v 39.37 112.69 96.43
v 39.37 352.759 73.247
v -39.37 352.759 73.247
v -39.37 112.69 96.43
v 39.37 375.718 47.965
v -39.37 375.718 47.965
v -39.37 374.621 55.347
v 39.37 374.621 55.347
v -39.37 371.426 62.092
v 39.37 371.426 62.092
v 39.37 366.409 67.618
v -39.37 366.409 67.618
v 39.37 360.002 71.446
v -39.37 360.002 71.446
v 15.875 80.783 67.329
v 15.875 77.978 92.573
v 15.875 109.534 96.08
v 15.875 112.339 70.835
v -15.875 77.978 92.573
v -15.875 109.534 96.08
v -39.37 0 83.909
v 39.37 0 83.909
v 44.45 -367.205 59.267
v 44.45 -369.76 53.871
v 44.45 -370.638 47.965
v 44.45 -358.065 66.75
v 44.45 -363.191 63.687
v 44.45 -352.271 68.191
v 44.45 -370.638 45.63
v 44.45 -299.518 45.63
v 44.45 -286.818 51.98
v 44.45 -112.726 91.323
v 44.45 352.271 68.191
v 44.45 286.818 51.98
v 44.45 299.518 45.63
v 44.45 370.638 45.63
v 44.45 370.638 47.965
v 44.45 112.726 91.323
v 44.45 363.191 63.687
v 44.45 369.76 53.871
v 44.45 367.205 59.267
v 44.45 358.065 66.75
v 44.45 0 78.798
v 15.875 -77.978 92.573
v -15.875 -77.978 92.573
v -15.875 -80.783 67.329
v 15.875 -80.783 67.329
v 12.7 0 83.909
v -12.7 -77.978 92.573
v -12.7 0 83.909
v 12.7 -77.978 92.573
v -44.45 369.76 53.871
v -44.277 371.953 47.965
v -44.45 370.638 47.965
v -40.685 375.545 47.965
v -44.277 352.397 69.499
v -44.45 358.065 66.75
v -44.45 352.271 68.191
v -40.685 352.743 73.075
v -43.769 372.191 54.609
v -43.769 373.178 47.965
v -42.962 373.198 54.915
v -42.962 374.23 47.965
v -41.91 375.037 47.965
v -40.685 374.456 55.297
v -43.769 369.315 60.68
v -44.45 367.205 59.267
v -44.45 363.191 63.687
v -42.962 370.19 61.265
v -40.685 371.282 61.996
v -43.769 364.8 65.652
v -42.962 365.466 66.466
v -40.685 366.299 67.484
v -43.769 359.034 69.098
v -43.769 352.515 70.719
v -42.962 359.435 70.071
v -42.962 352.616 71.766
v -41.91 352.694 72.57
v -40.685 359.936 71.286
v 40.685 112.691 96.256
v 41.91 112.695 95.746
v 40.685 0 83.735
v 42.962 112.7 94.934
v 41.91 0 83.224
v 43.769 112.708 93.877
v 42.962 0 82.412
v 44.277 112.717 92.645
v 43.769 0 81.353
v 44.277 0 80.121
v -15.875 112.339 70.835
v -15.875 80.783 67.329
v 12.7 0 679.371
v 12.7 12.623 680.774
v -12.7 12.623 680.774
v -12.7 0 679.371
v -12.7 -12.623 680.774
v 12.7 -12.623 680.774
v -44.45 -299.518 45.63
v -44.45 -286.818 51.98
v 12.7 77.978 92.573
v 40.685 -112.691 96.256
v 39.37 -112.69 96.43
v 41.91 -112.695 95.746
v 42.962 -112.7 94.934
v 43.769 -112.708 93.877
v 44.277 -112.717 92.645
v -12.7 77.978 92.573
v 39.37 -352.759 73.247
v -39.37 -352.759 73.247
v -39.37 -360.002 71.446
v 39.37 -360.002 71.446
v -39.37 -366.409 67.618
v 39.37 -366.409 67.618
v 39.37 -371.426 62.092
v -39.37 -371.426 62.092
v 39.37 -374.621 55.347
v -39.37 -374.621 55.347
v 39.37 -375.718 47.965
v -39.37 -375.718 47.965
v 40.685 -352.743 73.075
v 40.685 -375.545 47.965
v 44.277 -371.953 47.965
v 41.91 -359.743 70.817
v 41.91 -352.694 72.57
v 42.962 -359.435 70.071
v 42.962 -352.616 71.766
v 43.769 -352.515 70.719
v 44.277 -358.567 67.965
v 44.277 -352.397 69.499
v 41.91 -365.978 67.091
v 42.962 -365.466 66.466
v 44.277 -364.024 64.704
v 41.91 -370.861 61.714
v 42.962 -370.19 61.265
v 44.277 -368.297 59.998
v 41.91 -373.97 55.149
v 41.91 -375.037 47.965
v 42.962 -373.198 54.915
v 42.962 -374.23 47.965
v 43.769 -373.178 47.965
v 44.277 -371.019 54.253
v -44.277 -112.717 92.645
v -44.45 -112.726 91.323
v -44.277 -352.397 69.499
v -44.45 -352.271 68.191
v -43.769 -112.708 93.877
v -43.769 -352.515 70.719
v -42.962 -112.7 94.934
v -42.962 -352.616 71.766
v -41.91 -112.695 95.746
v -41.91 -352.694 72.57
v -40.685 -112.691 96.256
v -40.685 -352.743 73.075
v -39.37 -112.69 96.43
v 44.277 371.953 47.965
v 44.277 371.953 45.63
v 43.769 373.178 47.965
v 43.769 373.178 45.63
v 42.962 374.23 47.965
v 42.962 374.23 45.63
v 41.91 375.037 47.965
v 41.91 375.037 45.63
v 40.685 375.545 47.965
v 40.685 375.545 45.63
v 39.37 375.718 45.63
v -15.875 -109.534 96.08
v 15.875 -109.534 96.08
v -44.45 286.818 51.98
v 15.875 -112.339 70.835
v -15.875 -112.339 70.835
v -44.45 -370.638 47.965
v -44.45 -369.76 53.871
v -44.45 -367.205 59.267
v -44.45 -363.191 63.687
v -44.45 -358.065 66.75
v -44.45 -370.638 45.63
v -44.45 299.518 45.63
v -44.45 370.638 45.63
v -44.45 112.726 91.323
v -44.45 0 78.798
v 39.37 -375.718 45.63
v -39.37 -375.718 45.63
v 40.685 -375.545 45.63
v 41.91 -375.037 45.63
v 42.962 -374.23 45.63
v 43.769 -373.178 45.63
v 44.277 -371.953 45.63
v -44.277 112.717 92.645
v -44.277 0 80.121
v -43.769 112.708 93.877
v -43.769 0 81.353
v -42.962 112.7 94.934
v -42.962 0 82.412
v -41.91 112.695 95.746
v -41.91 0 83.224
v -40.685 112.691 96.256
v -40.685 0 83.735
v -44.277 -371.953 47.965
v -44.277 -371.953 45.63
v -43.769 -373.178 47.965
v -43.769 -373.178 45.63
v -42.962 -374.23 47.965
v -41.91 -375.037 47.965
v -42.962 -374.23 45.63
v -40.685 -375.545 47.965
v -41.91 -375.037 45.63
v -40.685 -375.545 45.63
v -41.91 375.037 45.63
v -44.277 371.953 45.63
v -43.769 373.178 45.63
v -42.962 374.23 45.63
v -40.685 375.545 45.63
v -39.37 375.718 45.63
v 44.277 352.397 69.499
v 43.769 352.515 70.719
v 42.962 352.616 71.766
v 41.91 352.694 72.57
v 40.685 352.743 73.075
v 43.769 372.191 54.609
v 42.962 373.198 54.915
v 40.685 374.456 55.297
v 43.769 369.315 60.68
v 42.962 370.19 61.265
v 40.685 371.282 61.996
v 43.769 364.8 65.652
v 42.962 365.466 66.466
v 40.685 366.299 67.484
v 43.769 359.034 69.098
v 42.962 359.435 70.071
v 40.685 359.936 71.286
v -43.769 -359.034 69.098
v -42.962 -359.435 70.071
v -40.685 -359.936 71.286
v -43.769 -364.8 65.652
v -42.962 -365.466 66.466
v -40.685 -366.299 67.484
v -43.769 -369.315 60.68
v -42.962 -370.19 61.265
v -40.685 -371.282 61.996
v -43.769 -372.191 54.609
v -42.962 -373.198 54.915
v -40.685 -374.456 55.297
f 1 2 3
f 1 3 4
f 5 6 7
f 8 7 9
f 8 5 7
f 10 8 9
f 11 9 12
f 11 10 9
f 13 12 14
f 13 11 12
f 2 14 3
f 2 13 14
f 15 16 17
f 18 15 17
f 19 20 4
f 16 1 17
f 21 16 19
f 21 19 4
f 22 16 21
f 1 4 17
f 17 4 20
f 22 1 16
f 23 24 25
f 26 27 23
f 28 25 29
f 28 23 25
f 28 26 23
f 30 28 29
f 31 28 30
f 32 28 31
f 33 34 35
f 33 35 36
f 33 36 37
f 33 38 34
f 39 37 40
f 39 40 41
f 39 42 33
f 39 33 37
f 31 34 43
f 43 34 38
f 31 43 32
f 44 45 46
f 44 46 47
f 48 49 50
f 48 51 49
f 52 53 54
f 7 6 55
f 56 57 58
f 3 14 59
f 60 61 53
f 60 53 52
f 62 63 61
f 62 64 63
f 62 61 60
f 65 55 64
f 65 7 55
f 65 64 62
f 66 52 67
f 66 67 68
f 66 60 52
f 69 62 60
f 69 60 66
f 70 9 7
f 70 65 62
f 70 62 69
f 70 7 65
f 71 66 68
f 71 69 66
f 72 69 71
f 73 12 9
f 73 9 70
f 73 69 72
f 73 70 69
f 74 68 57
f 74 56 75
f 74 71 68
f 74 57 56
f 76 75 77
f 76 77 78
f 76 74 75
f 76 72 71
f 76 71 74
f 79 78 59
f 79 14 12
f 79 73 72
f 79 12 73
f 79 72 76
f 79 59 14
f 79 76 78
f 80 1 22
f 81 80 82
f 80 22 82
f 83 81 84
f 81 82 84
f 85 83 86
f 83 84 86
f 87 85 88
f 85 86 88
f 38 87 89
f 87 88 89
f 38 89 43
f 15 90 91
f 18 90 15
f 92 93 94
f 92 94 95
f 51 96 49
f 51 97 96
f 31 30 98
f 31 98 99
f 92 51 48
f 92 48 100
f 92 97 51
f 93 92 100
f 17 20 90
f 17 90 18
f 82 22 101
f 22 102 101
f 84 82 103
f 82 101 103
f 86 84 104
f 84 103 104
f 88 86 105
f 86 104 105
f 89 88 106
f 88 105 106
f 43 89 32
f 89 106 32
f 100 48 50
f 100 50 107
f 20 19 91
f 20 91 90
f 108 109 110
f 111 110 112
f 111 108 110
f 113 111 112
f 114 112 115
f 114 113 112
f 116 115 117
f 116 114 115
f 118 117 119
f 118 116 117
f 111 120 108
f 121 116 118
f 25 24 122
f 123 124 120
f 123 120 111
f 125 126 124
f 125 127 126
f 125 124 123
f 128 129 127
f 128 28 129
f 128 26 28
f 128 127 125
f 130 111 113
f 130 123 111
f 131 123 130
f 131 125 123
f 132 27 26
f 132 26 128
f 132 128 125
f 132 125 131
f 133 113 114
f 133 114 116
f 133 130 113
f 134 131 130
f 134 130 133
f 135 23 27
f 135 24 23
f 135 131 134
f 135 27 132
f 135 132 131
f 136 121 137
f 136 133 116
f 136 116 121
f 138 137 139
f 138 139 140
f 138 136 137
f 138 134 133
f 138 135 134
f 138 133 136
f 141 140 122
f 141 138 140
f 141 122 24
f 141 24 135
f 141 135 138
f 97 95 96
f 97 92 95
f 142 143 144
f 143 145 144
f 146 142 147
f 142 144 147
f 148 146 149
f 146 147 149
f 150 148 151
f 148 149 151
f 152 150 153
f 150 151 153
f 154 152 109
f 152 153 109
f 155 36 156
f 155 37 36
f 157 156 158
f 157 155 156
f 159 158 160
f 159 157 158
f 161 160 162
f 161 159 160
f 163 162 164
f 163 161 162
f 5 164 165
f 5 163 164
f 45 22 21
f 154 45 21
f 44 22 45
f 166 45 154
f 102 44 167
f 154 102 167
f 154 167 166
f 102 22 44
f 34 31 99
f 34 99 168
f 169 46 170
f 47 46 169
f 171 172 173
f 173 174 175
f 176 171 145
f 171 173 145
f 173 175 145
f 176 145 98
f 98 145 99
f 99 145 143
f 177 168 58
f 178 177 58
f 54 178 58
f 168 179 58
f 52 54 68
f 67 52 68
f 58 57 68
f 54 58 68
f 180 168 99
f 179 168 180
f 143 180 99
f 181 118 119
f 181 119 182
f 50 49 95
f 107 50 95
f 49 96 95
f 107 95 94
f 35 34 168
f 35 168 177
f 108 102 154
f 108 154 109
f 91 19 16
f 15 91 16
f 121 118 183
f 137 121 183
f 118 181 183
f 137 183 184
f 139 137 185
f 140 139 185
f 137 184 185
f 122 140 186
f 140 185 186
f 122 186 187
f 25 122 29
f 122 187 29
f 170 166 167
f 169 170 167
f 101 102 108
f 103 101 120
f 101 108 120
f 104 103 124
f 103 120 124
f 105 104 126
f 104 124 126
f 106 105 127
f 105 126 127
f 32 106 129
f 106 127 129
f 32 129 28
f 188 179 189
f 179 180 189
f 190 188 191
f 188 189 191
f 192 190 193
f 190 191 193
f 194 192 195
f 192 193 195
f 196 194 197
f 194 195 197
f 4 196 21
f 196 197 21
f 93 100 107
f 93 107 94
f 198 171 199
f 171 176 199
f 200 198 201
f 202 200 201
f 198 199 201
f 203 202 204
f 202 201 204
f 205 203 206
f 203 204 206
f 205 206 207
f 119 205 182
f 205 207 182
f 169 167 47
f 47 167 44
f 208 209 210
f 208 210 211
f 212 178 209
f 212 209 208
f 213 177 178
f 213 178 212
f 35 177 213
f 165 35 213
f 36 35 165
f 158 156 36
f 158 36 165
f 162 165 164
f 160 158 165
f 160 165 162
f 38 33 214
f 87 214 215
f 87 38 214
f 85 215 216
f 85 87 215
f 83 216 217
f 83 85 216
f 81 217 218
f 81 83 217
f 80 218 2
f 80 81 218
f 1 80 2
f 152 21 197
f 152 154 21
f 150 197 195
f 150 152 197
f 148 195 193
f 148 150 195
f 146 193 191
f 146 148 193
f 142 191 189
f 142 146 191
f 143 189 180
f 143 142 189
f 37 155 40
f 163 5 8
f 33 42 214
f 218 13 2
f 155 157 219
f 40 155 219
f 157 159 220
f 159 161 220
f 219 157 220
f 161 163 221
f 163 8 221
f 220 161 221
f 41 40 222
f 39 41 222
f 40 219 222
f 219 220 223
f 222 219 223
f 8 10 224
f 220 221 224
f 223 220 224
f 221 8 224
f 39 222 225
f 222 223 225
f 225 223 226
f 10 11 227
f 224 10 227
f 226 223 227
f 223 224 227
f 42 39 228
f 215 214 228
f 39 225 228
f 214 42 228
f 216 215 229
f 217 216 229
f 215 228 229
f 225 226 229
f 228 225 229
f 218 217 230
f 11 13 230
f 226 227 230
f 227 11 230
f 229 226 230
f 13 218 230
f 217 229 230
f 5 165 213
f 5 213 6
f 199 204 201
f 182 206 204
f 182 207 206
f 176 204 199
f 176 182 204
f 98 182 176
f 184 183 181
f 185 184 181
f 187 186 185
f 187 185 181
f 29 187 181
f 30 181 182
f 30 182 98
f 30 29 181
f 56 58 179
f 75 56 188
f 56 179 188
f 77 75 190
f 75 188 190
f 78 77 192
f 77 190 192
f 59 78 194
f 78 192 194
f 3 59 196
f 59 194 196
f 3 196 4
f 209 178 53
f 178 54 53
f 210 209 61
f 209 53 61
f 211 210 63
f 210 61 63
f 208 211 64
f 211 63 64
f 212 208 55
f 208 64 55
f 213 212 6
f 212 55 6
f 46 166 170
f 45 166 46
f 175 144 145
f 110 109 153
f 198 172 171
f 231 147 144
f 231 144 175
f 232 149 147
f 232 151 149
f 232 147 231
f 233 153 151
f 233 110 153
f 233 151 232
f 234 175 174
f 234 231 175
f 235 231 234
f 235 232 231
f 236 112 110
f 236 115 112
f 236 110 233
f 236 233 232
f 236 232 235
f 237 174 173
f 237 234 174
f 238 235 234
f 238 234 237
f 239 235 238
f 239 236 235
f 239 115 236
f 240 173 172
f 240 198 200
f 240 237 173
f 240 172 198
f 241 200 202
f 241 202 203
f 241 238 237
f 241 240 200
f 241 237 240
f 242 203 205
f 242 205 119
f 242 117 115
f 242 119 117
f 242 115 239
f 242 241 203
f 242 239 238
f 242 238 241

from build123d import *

# Parameters (mm, degrees)
F1_DEPTH = 44.45
F2_W     = 31.75
F2_H     = 31.75
F3_DEPTH = 25.4
F4_W     = 31.75
F4_H     = 31.75
F5_DEPTH = 25.4
F6_R     = 5.08
F8_DEPTH = 12.7


with BuildPart() as f1:
    # F0 (on Right) → F1 (new body, symmetric)
    with BuildSketch(Plane.YZ):
        with BuildLine():
            Line((0, 51.980157), (0, 83.909086))
            Line((0, 83.909086), (-112.68964, 96.430157))
            Line((-112.68964, 96.430157), (-352.759174, 73.247209))
            ThreePointArc((-352.759174, 73.247209), (-369.121611, 65.04034), (-375.717714, 47.964818))
            Line((-375.717714, 47.964818), (-375.717714, 45.630157))
            Line((-375.717714, 45.630157), (-299.517714, 45.630157))
            Line((-299.517714, 45.630157), (-286.817714, 51.980157))
            Line((-286.817714, 51.980157), (0, 51.980157))
        make_face()
        with BuildLine():
            Line((112.68964, 96.430157), (0, 83.909086))
            Line((0, 83.909086), (0, 51.980157))
            Line((0, 51.980157), (286.817714, 51.980157))
            Line((286.817714, 51.980157), (299.517714, 45.630157))
            Line((299.517714, 45.630157), (375.717714, 45.630157))
            Line((375.717714, 45.630157), (375.717714, 47.964818))
            ThreePointArc((375.717714, 47.964818), (369.121611, 65.04034), (352.759174, 73.247209))
            Line((352.759174, 73.247209), (112.68964, 96.430157))
        make_face()
    extrude(amount=F1_DEPTH, both=True)

    # F2 (on face) → F3 (cut)
    with BuildSketch(Plane(origin=(0, 9.209534, 82.885804), x_dir=(1, 0, 0), z_dir=(0, 0.110432, 0.993884))):
        with Locations((0, -103.59933)):
            Rectangle(F2_W, F2_H)
    extrude(amount=-F3_DEPTH, mode=Mode.SUBTRACT)

    # F4 (on face) → F5 (cut)
    with BuildSketch(Plane(origin=(0, -9.209534, 82.885804), x_dir=(1, 0, 0), z_dir=(0, -0.110432, 0.993884))):
        with Locations((0, 103.59933)):
            Rectangle(F4_W, F4_H)
    extrude(amount=-F5_DEPTH, mode=Mode.SUBTRACT)

    # F6
    f6_edges = [f1.edges().sort_by_distance(p)[0] for p in [
        (-44.45, 232.724407, 84.838683),
        (-44.45, -232.724407, 84.838683),
        (-44.45, -56.34482, 90.169621),
        (-44.45, 56.34482, 90.169621),
        (44.45, 369.121611, 65.04034),
        (44.45, 232.724407, 84.838683),
        (44.45, 56.34482, 90.169621),
        (44.45, -56.34482, 90.169621),
        (44.45, -232.724407, 84.838683),
        (44.45, -369.121611, 65.04034),
    ]]
    fillet(f6_edges, radius=F6_R)


with BuildPart() as f8:
    # F7 (on Right) → F8 (new body, symmetric)
    with BuildSketch(Plane.YZ):
        Polygon((-77.97824, 92.573327), (0, 83.909078), (0, 679.371438), (-12.622616, 680.773951), align=None)
        Polygon((0, 679.371438), (0, 83.909078), (77.97824, 92.573327), (12.622616, 680.773951), align=None)
    extrude(amount=F8_DEPTH, both=True)


solid = Compound([f1.part, f8.part])
